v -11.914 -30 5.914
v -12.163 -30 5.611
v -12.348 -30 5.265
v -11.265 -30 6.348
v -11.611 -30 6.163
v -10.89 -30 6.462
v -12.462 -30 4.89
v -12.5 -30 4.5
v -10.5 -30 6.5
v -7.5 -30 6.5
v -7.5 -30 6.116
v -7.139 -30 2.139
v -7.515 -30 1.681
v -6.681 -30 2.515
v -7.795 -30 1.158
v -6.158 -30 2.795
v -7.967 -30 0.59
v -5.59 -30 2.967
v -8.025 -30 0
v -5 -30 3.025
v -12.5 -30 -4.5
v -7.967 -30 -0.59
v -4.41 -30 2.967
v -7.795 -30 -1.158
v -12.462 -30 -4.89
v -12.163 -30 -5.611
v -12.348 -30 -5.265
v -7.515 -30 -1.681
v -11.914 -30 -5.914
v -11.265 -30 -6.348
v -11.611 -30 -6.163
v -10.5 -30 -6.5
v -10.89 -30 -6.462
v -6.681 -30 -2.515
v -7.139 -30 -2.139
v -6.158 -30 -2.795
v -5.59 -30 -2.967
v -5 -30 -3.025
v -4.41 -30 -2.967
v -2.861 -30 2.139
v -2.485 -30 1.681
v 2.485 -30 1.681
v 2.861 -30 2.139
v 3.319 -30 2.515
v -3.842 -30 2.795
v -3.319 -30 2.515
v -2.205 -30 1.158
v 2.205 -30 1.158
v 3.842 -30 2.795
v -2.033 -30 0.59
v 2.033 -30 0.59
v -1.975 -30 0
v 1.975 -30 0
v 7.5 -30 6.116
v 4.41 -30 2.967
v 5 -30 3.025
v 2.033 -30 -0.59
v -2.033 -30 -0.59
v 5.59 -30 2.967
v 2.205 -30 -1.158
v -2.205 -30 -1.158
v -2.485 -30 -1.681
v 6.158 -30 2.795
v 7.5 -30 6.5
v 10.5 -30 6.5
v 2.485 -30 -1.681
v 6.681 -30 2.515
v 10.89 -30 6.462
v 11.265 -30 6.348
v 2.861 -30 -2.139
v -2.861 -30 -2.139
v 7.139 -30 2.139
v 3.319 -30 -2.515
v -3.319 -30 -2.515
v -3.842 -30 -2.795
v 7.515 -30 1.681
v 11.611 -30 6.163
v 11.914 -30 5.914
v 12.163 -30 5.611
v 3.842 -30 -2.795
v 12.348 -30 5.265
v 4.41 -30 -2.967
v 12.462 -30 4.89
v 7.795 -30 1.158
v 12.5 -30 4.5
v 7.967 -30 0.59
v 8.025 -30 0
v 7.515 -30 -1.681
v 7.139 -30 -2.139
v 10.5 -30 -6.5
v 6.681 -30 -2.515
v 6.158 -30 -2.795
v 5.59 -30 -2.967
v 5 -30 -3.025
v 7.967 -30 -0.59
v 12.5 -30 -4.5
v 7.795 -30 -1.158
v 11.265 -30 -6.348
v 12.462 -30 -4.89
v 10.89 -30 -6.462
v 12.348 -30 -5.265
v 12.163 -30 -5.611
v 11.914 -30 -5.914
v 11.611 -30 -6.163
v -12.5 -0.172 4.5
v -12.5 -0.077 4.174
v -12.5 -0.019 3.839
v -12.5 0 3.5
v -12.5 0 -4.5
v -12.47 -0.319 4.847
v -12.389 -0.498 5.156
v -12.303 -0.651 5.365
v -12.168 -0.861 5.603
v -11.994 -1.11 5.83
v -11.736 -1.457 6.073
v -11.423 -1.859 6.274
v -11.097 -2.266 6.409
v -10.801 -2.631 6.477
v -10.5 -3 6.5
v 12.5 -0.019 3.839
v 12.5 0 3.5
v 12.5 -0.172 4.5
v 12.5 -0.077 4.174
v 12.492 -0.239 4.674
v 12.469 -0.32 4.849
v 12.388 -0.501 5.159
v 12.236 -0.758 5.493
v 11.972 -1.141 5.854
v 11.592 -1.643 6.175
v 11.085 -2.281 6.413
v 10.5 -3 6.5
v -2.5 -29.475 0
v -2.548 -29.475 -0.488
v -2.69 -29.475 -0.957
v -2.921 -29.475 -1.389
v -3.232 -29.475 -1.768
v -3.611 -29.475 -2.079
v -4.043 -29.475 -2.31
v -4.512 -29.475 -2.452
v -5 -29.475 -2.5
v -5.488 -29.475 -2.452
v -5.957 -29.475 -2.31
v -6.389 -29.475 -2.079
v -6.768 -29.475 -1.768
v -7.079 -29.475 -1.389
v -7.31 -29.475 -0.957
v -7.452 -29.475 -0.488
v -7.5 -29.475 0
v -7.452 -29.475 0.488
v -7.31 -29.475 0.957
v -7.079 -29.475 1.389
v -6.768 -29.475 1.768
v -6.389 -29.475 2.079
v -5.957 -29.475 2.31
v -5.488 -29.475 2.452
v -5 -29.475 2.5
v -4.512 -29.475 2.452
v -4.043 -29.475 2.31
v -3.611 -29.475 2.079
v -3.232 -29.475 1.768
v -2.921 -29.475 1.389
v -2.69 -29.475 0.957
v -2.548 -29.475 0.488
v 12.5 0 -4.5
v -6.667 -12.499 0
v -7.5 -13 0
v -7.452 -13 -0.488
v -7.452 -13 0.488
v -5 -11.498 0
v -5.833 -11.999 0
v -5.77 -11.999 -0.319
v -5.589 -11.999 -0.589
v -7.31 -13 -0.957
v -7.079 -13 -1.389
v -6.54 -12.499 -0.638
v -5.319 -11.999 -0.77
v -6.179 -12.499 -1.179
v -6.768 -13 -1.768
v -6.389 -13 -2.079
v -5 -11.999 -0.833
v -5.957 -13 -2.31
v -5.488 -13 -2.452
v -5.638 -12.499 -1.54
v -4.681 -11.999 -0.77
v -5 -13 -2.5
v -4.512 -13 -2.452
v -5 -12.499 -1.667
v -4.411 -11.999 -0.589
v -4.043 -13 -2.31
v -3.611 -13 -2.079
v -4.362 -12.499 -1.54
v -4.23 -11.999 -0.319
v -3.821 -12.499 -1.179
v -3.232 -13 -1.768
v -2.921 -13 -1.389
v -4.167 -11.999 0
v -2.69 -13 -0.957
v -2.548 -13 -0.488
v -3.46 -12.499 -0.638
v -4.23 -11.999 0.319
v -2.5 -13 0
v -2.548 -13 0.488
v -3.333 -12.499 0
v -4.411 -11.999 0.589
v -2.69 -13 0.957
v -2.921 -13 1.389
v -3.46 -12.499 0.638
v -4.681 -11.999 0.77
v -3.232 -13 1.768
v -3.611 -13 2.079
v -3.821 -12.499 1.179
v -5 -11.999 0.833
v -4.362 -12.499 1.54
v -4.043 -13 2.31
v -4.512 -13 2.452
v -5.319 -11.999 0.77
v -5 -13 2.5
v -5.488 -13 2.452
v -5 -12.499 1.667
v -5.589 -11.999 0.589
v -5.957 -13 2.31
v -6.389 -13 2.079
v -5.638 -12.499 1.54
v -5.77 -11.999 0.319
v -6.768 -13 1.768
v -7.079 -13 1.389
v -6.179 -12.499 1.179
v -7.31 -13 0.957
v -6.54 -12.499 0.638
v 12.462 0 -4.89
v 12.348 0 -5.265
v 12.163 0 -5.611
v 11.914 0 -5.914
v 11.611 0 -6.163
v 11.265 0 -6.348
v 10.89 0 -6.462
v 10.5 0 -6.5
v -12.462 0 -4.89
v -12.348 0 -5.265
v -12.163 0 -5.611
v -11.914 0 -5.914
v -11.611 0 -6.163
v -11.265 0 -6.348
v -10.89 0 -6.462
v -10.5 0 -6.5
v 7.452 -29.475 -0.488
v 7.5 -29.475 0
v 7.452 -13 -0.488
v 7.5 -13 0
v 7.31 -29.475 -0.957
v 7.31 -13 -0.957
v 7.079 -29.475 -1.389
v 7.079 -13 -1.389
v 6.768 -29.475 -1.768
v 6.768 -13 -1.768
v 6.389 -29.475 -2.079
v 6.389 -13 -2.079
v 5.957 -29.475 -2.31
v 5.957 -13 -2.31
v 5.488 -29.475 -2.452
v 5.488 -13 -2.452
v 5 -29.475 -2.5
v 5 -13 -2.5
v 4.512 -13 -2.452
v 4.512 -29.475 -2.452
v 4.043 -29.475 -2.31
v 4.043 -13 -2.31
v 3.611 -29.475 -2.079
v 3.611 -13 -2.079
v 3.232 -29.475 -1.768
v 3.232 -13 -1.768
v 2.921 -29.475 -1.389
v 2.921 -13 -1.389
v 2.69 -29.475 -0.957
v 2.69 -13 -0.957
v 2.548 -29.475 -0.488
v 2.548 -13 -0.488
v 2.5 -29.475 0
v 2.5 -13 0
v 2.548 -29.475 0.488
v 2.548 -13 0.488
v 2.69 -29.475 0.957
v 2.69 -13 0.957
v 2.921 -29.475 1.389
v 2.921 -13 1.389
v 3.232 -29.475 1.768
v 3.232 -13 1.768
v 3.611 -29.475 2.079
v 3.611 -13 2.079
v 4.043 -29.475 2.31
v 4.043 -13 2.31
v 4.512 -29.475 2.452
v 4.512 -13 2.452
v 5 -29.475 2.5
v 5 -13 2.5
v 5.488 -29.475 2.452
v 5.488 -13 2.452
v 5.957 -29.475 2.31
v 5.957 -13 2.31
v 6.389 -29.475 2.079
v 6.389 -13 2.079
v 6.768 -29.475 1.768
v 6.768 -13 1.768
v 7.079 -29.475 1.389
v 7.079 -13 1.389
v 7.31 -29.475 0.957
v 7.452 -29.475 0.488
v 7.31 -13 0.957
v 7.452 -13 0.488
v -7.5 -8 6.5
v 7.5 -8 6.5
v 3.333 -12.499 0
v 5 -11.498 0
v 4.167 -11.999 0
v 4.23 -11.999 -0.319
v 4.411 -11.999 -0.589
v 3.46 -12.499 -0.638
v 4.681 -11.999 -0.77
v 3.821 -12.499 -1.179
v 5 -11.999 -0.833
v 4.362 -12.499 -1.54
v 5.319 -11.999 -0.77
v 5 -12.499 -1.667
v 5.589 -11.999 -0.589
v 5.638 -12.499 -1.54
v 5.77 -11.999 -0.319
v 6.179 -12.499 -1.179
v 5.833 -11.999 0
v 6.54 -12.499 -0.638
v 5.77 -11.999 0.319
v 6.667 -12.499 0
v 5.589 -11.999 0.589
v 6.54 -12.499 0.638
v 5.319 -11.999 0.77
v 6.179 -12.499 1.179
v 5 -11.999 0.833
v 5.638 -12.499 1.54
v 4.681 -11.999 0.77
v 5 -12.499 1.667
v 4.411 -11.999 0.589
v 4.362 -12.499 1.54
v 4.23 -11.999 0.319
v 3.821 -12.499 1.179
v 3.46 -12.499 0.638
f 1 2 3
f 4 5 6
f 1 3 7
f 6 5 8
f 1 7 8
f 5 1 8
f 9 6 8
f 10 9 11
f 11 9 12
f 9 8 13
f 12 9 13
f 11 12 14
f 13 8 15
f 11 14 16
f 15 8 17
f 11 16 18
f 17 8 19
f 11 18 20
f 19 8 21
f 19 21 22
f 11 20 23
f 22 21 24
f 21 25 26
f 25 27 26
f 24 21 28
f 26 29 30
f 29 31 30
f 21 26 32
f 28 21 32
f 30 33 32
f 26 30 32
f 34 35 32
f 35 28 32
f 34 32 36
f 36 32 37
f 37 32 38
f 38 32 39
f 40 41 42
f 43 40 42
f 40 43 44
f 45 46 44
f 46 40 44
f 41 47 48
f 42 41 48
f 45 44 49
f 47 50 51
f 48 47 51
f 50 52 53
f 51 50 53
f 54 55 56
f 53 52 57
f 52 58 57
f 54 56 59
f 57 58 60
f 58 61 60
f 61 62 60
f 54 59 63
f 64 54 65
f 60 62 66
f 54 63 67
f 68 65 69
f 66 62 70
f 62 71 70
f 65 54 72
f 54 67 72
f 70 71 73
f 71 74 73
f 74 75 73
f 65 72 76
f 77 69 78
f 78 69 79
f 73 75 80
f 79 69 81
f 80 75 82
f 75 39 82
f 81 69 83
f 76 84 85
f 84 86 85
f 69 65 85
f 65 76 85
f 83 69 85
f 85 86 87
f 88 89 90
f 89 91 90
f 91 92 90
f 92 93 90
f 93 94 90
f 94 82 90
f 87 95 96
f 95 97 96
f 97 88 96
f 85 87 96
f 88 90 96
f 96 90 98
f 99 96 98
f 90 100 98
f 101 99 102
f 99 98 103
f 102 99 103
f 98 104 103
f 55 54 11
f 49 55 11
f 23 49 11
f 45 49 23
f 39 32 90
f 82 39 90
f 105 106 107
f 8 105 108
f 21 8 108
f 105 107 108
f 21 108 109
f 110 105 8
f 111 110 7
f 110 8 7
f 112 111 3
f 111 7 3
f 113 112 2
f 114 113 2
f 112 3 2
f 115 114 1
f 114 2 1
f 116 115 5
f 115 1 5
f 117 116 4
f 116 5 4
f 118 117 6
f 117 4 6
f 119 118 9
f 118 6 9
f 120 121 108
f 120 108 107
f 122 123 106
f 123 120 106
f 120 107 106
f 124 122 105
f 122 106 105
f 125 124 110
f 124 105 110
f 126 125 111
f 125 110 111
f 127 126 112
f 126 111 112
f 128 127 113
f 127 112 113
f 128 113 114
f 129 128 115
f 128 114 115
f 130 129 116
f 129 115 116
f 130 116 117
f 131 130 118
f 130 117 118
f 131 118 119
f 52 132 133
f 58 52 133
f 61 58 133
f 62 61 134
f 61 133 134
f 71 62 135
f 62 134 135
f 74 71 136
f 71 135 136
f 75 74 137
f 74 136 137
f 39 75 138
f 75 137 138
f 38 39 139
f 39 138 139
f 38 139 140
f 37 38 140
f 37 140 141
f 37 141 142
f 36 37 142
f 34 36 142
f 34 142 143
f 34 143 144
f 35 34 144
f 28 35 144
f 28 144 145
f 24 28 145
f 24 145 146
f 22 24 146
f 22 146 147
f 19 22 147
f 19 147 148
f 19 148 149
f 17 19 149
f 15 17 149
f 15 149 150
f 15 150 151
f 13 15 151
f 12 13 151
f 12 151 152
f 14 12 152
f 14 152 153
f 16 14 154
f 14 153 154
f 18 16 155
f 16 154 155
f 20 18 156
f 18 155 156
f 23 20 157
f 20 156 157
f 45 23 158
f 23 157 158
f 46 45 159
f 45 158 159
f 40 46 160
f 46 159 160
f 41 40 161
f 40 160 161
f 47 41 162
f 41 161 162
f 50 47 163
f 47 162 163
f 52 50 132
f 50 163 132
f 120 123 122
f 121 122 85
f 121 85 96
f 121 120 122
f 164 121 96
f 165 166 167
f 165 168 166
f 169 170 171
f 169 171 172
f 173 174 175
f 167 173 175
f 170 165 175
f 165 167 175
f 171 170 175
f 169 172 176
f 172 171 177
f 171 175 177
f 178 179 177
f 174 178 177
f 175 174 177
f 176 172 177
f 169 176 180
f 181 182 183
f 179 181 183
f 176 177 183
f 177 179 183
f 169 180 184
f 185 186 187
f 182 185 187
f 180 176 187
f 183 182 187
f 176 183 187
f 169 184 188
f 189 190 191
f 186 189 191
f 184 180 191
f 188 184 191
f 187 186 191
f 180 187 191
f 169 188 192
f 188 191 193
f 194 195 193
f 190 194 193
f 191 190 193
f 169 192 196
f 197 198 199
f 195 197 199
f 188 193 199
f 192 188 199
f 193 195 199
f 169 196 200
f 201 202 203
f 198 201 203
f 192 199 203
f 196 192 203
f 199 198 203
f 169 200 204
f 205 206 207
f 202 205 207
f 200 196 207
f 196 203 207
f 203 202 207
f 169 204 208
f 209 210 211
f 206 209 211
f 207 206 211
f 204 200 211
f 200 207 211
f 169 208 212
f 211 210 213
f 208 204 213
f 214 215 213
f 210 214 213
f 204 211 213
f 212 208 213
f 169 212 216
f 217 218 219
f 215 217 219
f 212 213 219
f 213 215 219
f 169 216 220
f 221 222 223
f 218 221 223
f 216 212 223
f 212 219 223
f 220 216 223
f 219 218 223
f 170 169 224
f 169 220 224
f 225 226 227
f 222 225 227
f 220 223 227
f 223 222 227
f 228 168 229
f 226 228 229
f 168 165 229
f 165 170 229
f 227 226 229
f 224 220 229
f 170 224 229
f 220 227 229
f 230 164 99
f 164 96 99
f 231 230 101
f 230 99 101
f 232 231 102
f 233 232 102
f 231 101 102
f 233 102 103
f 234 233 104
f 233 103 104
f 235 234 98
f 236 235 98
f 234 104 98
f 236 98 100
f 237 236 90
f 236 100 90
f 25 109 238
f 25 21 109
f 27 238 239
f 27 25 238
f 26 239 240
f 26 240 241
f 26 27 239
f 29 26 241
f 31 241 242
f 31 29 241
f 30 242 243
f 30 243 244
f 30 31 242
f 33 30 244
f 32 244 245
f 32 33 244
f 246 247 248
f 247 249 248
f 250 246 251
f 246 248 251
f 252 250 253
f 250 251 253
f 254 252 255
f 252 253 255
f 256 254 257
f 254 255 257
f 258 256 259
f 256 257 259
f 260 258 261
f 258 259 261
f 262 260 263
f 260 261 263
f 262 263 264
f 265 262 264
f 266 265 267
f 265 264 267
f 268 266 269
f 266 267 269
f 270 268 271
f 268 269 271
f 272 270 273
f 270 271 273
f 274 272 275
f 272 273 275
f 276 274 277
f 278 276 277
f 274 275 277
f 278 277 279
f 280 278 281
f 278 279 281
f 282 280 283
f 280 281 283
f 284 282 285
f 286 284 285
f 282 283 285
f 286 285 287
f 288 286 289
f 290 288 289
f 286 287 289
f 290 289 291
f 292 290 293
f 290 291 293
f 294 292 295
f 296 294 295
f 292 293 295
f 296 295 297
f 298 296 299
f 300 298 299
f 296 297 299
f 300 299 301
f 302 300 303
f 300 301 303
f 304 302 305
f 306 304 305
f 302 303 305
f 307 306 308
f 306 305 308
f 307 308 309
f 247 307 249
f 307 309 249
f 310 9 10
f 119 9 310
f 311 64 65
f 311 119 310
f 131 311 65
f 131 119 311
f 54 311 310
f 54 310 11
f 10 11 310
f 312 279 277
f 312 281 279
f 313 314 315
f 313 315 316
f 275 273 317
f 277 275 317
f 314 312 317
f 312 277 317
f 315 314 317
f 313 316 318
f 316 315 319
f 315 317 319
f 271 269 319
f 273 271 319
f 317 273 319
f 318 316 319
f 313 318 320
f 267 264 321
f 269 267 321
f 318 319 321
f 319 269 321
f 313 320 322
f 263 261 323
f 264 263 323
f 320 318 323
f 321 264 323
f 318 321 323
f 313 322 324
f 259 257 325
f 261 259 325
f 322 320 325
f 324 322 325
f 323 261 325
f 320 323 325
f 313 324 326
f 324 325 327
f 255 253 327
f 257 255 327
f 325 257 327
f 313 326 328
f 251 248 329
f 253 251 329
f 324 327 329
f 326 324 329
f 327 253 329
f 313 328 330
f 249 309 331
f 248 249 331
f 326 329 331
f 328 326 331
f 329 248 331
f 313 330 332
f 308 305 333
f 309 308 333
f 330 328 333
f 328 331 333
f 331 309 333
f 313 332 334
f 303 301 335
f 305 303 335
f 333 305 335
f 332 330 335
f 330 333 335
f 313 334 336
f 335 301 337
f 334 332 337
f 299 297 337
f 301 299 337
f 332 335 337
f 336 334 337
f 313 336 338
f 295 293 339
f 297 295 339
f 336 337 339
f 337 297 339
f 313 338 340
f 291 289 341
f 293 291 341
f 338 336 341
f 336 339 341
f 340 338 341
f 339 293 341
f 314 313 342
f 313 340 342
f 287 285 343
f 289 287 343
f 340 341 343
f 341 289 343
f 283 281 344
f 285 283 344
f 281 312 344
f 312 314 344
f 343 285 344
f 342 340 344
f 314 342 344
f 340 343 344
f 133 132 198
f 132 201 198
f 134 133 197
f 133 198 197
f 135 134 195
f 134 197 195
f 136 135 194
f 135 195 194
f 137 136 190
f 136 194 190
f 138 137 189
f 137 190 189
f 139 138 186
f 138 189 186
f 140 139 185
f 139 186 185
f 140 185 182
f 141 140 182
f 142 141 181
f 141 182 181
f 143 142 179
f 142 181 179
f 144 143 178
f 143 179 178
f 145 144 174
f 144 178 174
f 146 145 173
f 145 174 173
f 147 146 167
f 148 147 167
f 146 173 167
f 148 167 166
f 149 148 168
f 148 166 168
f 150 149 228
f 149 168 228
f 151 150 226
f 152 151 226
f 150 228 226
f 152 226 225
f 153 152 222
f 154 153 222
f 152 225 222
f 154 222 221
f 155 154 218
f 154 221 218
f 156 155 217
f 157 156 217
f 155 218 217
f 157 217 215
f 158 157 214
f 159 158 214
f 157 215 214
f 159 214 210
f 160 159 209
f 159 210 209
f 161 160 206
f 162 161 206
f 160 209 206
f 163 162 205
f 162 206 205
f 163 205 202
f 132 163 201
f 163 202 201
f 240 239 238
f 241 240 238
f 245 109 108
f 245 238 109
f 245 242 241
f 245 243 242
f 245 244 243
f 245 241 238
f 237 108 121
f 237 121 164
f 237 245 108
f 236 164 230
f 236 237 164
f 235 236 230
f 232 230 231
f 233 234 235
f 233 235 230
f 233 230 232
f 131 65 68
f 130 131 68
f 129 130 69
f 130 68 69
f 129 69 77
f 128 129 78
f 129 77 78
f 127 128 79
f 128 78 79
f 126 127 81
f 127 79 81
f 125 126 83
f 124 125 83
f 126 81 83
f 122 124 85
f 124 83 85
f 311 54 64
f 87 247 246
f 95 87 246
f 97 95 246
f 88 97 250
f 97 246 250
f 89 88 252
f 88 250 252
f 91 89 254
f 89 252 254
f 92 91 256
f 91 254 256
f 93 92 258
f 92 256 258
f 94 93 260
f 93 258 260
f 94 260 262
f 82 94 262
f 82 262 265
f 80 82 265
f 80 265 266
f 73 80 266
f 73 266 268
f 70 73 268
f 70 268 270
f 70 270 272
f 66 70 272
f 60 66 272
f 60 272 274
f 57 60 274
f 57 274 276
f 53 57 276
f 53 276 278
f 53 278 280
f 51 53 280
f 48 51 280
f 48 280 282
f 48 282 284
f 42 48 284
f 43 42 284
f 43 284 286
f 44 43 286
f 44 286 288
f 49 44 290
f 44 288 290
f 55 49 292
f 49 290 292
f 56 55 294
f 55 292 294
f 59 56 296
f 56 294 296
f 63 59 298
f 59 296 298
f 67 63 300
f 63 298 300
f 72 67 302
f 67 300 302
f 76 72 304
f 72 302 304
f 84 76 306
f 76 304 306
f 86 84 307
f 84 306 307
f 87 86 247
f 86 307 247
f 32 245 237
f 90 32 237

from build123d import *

# Parameters (mm, degrees)
SKETCH1_W                   = 25
SKETCH1_H                   = 13
BOSS_EXTRUDE1_DEPTH         = 30
FILLET1_R                   = 2
FILLET2_R                   = 3
M6_TAPPED_HOLE1_D           = 5
M6_TAPPED_HOLE1_DEPTH       = 17
M6_TAPPED_HOLE1_CSINK_D     = 6.05
M6_TAPPED_HOLE1_CSINK_ANGLE = 90
M6_TAPPED_HOLE1_TIP         = 1.502151548
CUT_EXTRUDE1_DEPTH          = 7.5


with BuildPart() as part:
    # Sketch1 → Boss-Extrude1 (new body)
    with BuildSketch(Plane(origin=(0, 0, 0), x_dir=(1, 0, 0), z_dir=(0, 1, 0))):
        Rectangle(SKETCH1_W, SKETCH1_H)
    extrude(amount=-BOSS_EXTRUDE1_DEPTH)

    # Fillet1
    fillet1_edges = [part.edges().sort_by_distance(p)[0] for p in [
        (12.5, -15, 6.5),
        (-12.5, -15, 6.5),
        (-12.5, -15, -6.5),
        (12.5, -15, -6.5),
    ]]
    fillet(fillet1_edges, radius=FILLET1_R)

    # Fillet2
    # the kernel refuses this fillet: 3 mm, written as the material it takes off along each edge
    with BuildSketch(Plane(origin=(-18, 0, 6.5), x_dir=(0, -1, 0), z_dir=(1, 0, 0))) as fillet2_piece_1:
        with BuildLine():
            CenterArc((FILLET2_R, FILLET2_R), FILLET2_R, 180, 90)
            Line((0, FILLET2_R), (0, 0))
            Line((0, 0), (FILLET2_R, 0))
        make_face()
    extrude(amount=36, mode=Mode.SUBTRACT)

    # M6 Tapped Hole1
    with Locations(Plane(origin=(0, -30, 0), x_dir=(-1, 0, 0), z_dir=(0, -1, 0))):
        with Locations((-5, 0), (5, 0)):
            CounterSinkHole(M6_TAPPED_HOLE1_D / 2, M6_TAPPED_HOLE1_CSINK_D / 2, depth=M6_TAPPED_HOLE1_DEPTH, counter_sink_angle=M6_TAPPED_HOLE1_CSINK_ANGLE)
            with Locations((0, 0, -(M6_TAPPED_HOLE1_DEPTH + M6_TAPPED_HOLE1_TIP / 2))):  # 118° drill point
                Cone(0, M6_TAPPED_HOLE1_D / 2, M6_TAPPED_HOLE1_TIP, mode=Mode.SUBTRACT)

    # Sketch5 → Cut-Extrude1 (cut, symmetric)
    with BuildSketch(Plane(origin=(0, 0, 0), x_dir=(0, 0, -1), z_dir=(1, 0, 0))):
        Polygon((-6.5, -8), (-6.115988572, -30), (-6.5, -30), align=None)
    extrude(amount=CUT_EXTRUDE1_DEPTH, both=True, mode=Mode.SUBTRACT)


solid = part.part
